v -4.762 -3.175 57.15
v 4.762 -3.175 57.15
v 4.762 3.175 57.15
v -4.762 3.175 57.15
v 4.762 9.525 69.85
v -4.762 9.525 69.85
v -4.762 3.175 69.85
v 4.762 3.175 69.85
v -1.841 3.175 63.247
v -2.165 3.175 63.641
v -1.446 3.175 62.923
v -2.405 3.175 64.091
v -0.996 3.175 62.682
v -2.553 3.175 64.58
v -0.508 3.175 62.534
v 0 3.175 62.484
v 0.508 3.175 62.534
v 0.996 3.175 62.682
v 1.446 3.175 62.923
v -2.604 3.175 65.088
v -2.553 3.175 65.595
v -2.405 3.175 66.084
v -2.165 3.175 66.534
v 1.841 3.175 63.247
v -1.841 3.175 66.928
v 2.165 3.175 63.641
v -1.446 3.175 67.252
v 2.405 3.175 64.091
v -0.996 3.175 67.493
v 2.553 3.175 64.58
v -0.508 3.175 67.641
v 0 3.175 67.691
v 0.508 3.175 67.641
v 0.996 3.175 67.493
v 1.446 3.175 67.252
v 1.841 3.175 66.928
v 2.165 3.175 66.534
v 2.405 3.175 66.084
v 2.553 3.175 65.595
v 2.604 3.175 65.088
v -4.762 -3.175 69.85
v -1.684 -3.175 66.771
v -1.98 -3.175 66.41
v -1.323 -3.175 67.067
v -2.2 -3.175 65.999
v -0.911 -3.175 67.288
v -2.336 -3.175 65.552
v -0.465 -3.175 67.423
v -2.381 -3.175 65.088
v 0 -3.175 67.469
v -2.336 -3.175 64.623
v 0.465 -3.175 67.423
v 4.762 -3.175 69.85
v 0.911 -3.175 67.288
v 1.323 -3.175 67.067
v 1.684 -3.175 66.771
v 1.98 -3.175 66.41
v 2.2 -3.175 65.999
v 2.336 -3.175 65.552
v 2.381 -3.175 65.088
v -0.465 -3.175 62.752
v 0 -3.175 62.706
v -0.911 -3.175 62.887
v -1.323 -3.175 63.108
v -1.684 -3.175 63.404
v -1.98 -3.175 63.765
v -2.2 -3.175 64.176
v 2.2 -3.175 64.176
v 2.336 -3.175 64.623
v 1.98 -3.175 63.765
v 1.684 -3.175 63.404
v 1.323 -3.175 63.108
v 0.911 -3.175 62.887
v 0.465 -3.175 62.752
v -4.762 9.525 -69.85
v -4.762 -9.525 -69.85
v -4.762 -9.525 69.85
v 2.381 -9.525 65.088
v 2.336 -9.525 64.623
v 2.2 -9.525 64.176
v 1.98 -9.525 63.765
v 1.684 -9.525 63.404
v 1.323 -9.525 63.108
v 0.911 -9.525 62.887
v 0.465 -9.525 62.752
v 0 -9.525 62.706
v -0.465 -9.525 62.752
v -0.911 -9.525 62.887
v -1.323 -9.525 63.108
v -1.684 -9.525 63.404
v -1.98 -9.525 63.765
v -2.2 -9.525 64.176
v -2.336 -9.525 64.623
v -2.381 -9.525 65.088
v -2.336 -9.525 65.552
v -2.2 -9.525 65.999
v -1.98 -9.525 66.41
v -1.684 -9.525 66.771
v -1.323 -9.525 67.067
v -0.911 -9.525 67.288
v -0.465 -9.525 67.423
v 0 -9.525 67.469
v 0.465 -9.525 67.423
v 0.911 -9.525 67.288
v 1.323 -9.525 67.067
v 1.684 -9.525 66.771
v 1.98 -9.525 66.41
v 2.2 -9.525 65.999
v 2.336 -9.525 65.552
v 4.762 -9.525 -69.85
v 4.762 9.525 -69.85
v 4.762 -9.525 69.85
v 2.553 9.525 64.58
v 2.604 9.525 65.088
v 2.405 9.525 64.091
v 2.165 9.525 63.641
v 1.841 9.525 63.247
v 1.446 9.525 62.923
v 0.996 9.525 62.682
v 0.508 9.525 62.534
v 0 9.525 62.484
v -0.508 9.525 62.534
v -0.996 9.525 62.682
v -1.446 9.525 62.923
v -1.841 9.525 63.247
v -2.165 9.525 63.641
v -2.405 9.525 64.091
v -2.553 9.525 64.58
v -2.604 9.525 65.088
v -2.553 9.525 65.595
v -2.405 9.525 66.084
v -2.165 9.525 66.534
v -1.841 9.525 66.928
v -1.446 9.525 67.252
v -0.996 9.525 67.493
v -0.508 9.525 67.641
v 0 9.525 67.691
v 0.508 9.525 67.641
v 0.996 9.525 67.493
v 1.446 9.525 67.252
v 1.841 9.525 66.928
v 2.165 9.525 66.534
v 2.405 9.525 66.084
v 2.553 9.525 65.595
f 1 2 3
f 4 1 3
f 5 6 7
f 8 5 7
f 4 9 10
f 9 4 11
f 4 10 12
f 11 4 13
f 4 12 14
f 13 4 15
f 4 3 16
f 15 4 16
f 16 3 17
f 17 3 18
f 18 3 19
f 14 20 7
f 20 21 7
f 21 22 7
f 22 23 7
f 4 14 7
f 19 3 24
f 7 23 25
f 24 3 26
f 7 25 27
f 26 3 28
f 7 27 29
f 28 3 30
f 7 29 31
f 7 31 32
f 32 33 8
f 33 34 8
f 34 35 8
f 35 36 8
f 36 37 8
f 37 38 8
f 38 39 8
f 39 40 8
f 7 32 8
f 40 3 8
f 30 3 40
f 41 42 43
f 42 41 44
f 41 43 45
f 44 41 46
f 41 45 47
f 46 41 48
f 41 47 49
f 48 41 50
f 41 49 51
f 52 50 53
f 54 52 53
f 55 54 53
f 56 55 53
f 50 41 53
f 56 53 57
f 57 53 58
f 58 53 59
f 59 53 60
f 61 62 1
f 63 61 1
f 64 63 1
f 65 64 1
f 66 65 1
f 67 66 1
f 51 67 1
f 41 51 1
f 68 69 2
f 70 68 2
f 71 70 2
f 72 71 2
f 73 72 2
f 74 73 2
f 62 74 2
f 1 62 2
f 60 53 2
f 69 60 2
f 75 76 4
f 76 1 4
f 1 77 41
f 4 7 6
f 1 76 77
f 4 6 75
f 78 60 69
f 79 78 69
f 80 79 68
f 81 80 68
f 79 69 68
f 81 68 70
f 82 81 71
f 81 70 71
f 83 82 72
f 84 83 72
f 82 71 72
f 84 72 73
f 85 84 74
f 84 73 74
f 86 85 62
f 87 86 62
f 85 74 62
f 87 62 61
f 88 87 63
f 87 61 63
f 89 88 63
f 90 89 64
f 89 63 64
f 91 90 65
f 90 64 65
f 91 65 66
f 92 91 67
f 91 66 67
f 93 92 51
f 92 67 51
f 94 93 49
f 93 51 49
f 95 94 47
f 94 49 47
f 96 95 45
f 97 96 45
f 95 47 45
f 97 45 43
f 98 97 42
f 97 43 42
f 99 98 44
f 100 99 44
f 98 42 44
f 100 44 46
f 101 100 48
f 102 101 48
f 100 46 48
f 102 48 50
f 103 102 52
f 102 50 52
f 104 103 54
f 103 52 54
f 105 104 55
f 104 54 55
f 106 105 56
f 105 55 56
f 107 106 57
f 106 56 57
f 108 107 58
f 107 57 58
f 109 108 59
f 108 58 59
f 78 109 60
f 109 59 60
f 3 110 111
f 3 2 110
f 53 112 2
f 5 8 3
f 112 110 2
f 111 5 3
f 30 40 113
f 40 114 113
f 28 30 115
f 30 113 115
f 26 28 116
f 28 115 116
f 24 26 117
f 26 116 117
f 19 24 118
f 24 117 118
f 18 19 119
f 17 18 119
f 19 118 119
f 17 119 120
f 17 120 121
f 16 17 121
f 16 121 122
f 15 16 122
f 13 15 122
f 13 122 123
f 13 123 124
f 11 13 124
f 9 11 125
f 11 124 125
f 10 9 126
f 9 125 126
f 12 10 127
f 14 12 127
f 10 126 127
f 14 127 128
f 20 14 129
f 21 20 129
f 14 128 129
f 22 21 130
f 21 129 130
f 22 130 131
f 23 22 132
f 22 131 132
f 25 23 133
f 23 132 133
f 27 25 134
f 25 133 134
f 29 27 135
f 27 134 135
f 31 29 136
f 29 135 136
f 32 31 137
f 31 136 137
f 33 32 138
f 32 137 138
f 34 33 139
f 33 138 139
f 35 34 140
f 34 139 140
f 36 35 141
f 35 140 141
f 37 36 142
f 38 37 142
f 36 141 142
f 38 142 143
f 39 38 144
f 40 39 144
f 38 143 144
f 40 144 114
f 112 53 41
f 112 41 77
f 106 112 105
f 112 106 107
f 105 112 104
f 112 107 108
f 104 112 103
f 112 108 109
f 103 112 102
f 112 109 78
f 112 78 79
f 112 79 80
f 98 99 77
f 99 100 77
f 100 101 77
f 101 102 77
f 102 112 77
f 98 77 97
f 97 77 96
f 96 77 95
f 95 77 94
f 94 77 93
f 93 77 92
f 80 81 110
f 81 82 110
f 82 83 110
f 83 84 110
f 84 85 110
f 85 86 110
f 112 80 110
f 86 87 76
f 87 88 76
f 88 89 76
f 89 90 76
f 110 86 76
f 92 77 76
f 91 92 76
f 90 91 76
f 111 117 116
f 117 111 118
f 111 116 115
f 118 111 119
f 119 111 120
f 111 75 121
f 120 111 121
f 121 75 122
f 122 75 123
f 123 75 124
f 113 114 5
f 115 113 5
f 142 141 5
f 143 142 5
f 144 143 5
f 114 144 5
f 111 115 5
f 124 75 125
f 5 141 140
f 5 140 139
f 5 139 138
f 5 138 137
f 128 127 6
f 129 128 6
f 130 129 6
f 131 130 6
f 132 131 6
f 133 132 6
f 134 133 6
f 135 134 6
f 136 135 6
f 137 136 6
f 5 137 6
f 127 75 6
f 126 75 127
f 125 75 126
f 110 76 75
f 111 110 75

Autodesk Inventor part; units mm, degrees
ref_plane "YZ Plane" through (0, 0, 0) normal (1, 0, 0) x (0, 1, 0)
ref_plane "XZ Plane" through (0, 0, 0) normal (0, 1, 0) x (-1, 0, 0)
ref_plane "XY Plane" through (0, 0, 0) normal (0, 0, 1) x (1, 0, 0)
sketch "Sketch1" plane through (0, 0, 0) normal (1, 0, 0) x (0, 1, 0)
  line L0 (-9.525, -69.85) -> (9.525, -69.85)
  line L1 (9.525, -69.85) -> (9.525, 69.85)
  line L2 (9.525, 69.85) -> (-9.525, 69.85)
  line L3 (-9.525, 69.85) -> (-9.525, -69.85)
  line L4 (-9.525, -69.85) -> (9.525, 69.85) construction
  line L5 (9.525, -69.85) -> (-9.525, 69.85) construction
  point P0 (0, 0)
  dimension "d0" = 19.05
  dimension "d1" = 139.7
extrude "Extrusion1" add sketch "Sketch1" along normal mid plane 9.525
sketch "Sketch2" plane through (4.7625, 0, 0) normal (1, 0, 0) x (0, 0, -1)
  line L0 (-82.55, -3.175) -> (-57.15, -3.175)
  line L1 (-57.15, -3.175) -> (-57.15, 3.175)
  line L2 (-57.15, 3.175) -> (-82.55, 3.175)
  line L3 (-82.55, 3.175) -> (-82.55, -3.175)
  line L4 (-69.85, 9.525) -> (-69.85, -9.525) projected
  line L5 (-82.55, -3.175) -> (-57.15, 3.175) construction
  line L6 (-57.15, -3.175) -> (-82.55, 3.175) construction
  point P0 (0, 0)
  point P1 (-69.85, 0)
  point P2 (-69.85, 3.175)
  point P3 (-69.85, -3.175)
  dimension "d4" = 6.35
  dimension "d5" = 12.7
extrude "Extrusion2" cut sketch "Sketch2" against normal blind 25.4 contours L4 L2 L1 L0
sketch "Sketch3" plane through (-4.7625, 9.525, 69.85) normal (0, 1, 0) x (1, 0, 0)
  line L0 (9.525, 0) -> (0, 0) projected
  circle A0 centre (4.7625, 4.7625) radius 2.6035
  point P0 (4.7625, 69.85)
  point P1 (4.7625, 0)
  dimension "d8" = 5.207
  dimension "d9" = 4.7625
extrude "Extrusion3" cut sketch "Sketch3" against normal blind 6.35
sketch "Sketch4" plane through (-4.7625, 9.525, 69.85) normal (0, 1, 0) x (1, 0, 0)
  circle A0 centre (4.7625, 4.7625) radius 2.6035 projected
  circle A1 centre (4.7625, 4.7625) radius 2.3813
  point P0 (4.7625, 69.85)
  dimension "d12" = 4.7625
extrude "Extrusion4" cut sketch "Sketch4" against normal blind 25.4 contours A1
properties part number "ShortBraillePlunger"
